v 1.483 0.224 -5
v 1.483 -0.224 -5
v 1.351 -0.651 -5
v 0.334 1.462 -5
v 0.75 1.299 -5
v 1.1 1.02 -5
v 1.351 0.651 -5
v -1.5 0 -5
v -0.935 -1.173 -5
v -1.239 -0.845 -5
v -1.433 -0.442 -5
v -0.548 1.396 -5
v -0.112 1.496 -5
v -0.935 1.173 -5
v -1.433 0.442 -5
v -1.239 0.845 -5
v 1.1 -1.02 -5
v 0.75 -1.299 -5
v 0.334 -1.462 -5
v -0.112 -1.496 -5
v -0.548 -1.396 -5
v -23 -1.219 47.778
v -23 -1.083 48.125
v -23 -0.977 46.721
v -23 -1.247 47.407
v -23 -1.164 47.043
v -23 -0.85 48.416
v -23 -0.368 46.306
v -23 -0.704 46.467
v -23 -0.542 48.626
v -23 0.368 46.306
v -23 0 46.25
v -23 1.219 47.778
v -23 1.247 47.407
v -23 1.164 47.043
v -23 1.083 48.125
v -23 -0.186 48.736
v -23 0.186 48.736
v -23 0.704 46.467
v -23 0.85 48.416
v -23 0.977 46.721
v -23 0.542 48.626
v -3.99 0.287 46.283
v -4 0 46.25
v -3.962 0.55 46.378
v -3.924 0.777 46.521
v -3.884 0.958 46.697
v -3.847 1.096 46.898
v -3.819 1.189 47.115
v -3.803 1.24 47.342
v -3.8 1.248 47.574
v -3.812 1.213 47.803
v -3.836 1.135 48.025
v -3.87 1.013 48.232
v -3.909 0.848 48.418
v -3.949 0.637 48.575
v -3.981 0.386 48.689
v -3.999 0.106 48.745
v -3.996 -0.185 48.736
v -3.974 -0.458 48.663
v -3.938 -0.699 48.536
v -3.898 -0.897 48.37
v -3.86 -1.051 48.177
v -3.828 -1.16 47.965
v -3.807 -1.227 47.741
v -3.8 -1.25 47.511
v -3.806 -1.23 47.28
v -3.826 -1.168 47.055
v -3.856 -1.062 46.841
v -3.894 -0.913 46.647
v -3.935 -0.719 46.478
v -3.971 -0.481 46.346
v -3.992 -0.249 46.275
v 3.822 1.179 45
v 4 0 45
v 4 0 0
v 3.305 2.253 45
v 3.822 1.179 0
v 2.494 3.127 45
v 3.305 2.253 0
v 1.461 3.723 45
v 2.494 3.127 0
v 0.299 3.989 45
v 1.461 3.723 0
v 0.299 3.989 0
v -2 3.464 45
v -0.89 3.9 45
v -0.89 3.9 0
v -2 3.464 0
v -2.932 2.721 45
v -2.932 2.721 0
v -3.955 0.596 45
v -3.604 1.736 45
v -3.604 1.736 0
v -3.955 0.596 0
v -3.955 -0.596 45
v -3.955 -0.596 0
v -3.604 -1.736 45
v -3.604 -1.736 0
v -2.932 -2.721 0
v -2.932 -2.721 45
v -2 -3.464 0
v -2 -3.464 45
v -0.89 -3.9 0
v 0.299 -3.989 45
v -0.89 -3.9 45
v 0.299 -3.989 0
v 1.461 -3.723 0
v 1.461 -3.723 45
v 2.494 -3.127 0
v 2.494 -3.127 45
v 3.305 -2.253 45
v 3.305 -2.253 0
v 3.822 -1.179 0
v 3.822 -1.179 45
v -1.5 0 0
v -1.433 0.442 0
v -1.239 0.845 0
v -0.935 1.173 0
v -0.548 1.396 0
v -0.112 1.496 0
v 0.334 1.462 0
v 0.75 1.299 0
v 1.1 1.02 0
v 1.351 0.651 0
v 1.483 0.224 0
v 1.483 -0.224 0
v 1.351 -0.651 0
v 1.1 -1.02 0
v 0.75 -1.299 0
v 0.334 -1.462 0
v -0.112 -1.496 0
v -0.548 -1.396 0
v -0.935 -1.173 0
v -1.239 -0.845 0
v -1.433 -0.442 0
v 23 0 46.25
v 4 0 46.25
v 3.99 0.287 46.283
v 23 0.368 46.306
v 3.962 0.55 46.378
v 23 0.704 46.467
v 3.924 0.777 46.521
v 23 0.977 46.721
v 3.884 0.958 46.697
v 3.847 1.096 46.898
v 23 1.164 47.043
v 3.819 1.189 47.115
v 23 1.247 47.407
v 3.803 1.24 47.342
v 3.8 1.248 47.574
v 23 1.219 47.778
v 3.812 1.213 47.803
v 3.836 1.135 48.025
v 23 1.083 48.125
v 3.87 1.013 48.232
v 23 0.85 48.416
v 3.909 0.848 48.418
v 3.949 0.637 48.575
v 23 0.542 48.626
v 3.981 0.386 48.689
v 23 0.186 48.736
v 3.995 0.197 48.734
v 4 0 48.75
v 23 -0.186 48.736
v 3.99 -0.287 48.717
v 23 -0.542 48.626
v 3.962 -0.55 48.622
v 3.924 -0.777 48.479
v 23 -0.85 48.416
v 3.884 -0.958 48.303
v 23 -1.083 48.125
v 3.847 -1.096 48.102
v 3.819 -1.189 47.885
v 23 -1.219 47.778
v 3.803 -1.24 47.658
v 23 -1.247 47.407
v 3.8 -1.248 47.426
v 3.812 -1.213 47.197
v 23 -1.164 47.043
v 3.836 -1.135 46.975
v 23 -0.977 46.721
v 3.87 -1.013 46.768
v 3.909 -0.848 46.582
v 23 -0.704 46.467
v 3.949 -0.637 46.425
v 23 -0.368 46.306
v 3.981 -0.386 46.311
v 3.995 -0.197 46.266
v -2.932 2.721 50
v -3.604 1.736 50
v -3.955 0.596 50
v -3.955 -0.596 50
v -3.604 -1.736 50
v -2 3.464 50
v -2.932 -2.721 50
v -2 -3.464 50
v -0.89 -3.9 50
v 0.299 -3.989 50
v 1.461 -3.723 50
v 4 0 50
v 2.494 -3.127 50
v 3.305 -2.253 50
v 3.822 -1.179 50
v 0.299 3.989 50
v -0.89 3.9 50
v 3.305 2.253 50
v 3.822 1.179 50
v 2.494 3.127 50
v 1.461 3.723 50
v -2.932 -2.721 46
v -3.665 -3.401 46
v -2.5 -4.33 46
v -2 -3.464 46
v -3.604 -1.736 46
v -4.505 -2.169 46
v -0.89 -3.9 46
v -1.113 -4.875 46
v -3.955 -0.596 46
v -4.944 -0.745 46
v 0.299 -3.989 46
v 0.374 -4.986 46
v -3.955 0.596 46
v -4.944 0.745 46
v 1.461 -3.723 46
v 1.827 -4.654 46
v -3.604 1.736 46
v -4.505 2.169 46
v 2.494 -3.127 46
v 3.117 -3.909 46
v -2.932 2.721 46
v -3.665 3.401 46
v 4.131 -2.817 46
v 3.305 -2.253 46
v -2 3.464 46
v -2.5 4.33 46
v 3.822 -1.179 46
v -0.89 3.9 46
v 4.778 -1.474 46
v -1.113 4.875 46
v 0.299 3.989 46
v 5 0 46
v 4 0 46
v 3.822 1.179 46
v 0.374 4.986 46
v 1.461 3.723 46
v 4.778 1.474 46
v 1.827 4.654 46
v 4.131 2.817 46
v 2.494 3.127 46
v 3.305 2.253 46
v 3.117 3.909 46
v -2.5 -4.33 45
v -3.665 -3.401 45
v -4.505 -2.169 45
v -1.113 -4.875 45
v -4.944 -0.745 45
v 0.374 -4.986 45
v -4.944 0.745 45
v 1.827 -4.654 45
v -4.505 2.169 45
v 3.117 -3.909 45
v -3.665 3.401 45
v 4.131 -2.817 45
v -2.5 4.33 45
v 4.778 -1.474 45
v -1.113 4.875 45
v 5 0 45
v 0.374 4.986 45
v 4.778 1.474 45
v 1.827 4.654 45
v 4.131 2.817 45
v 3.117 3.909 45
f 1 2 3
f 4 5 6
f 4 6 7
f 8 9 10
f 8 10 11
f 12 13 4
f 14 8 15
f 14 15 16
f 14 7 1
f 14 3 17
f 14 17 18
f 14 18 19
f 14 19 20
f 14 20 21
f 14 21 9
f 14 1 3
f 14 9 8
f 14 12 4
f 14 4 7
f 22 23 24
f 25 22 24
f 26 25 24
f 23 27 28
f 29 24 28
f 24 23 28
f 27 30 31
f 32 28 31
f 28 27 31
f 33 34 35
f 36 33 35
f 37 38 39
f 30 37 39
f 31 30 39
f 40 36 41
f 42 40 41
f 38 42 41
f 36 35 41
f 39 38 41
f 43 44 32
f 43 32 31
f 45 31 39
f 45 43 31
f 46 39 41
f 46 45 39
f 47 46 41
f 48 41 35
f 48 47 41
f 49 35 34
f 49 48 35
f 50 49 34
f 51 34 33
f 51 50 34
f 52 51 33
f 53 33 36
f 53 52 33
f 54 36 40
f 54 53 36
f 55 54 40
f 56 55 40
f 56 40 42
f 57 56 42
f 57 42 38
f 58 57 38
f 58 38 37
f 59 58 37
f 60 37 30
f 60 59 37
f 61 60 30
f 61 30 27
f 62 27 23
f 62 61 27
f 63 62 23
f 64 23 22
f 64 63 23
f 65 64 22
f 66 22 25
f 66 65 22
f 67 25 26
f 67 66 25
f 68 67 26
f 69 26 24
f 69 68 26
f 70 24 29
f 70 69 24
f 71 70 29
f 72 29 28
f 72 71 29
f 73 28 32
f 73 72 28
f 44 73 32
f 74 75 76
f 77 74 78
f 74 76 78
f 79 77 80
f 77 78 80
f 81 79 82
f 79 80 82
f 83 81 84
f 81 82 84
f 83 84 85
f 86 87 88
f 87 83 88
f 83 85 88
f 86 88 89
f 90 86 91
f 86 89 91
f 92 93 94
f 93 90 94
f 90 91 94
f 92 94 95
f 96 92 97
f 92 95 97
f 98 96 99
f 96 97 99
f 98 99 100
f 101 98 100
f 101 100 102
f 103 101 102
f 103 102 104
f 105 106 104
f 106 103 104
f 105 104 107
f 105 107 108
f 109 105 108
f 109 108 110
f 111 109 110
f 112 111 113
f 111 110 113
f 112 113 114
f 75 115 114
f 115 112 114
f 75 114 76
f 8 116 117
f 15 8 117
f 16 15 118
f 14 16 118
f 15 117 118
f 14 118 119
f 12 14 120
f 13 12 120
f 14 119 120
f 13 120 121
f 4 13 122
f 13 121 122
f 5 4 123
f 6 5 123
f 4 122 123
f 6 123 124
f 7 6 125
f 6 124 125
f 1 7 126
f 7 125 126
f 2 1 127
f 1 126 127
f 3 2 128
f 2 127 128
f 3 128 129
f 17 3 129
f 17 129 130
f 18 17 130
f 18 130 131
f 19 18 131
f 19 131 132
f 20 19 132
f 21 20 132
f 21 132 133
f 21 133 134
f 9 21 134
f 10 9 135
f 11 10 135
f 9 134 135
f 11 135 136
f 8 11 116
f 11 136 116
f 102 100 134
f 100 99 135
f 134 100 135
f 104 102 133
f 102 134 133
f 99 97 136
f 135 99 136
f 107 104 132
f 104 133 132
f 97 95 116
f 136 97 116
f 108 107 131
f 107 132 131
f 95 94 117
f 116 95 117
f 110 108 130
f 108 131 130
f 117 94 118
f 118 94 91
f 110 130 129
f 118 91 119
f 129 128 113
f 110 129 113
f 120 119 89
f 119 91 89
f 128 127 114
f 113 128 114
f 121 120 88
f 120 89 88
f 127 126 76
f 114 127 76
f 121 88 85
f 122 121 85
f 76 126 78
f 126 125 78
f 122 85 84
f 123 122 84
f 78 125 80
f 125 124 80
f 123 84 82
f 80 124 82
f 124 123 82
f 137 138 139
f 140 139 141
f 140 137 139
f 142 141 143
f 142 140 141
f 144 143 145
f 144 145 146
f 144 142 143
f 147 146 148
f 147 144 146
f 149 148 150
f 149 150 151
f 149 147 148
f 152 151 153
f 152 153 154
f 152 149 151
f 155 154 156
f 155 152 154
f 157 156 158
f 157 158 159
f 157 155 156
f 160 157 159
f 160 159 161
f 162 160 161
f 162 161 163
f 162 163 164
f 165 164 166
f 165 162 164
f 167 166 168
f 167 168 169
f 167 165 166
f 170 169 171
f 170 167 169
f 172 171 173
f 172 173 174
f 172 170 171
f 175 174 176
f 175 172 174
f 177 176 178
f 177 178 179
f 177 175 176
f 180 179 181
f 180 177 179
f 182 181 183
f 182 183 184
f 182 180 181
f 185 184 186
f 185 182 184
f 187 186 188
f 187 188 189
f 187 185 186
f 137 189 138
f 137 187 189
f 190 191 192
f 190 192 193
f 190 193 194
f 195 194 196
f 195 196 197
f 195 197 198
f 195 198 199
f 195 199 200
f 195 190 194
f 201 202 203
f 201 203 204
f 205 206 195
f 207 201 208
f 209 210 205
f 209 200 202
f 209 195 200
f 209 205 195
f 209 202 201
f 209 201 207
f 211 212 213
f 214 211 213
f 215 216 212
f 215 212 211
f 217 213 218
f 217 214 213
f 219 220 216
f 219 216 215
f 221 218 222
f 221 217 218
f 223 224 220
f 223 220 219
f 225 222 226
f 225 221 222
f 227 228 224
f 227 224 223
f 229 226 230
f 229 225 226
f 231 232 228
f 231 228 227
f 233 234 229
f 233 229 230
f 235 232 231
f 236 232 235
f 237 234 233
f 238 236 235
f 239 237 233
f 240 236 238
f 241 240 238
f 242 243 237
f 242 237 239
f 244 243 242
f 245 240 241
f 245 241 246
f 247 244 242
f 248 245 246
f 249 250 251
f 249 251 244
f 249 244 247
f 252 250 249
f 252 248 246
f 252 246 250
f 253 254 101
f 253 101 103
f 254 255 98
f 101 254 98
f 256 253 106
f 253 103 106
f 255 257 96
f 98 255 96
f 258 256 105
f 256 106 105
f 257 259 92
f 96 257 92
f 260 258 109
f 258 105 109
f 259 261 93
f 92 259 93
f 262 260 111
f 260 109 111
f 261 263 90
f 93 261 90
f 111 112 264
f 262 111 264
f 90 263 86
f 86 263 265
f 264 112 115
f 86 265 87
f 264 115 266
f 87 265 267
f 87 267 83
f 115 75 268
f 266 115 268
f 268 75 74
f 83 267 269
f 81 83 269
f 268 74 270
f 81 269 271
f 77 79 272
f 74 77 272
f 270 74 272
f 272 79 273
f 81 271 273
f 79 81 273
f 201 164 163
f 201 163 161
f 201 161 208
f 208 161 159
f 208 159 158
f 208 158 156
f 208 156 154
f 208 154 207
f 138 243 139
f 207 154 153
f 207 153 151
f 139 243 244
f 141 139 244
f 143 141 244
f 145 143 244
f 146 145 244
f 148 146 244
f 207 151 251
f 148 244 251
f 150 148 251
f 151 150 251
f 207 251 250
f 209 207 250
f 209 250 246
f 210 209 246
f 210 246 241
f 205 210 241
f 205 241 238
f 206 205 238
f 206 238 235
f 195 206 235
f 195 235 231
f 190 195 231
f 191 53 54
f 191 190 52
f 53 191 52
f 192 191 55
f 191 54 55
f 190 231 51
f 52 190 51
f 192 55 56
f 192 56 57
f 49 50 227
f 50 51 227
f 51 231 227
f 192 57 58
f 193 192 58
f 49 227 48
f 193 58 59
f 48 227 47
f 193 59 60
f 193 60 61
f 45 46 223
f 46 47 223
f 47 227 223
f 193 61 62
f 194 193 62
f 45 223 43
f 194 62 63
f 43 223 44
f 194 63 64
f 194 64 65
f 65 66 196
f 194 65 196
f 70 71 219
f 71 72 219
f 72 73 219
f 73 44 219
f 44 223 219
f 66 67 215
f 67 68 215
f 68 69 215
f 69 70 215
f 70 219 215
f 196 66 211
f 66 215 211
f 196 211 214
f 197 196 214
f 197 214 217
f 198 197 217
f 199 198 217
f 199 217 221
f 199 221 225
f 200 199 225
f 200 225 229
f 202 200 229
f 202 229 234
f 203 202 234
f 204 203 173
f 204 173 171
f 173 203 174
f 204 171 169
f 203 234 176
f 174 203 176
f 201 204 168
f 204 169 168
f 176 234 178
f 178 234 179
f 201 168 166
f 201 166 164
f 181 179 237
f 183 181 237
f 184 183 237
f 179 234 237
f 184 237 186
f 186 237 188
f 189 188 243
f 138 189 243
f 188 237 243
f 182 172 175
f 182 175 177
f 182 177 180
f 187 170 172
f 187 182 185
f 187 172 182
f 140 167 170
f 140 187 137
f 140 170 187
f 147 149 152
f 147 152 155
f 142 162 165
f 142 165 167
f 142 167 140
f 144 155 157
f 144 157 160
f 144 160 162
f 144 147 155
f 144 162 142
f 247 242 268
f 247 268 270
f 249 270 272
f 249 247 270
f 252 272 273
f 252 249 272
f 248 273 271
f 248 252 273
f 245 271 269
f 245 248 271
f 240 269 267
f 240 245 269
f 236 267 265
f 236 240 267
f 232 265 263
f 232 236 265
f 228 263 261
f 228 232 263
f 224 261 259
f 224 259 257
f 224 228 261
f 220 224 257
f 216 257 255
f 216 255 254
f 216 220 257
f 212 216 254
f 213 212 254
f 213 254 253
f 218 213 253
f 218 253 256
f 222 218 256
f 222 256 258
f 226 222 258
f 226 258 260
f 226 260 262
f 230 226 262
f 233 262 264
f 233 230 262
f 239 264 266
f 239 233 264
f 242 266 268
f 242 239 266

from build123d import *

# Parameters (mm, degrees)
SKETCH1_R           = 4
BOSS_EXTRUDE1_DEPTH = 50
SKETCH2_R           = 5
BOSS_EXTRUDE2_DEPTH = 1
SKETCH3_R           = 1.25
BOSS_EXTRUDE3_DEPTH = 23
SKETCH4_R           = 1.5
BOSS_EXTRUDE4_DEPTH = 5


with BuildPart() as part:
    # Sketch1 → Boss-Extrude1 (new body)
    with BuildSketch(Plane.XY):
        Circle(SKETCH1_R)
    extrude(amount=BOSS_EXTRUDE1_DEPTH)

    # Sketch2 → Boss-Extrude2 (add)
    with BuildSketch(Plane.XY.offset(46)):
        Circle(SKETCH2_R)
    extrude(amount=-BOSS_EXTRUDE2_DEPTH)

    # Sketch3 → Boss-Extrude3 (add, symmetric)
    with BuildSketch(Plane(origin=(0, 0, 0), x_dir=(0, 0, -1), z_dir=(1, 0, 0))):
        with Locations((-47.5, 0)):
            Circle(SKETCH3_R)
    extrude(amount=BOSS_EXTRUDE3_DEPTH, both=True)

    # Sketch4 → Boss-Extrude4 (add)
    with BuildSketch(Plane(origin=(0, 0, 0), x_dir=(-1, 0, 0), z_dir=(0, 0, -1))):
        Circle(SKETCH4_R)
    extrude(amount=BOSS_EXTRUDE4_DEPTH)


solid = part.part
